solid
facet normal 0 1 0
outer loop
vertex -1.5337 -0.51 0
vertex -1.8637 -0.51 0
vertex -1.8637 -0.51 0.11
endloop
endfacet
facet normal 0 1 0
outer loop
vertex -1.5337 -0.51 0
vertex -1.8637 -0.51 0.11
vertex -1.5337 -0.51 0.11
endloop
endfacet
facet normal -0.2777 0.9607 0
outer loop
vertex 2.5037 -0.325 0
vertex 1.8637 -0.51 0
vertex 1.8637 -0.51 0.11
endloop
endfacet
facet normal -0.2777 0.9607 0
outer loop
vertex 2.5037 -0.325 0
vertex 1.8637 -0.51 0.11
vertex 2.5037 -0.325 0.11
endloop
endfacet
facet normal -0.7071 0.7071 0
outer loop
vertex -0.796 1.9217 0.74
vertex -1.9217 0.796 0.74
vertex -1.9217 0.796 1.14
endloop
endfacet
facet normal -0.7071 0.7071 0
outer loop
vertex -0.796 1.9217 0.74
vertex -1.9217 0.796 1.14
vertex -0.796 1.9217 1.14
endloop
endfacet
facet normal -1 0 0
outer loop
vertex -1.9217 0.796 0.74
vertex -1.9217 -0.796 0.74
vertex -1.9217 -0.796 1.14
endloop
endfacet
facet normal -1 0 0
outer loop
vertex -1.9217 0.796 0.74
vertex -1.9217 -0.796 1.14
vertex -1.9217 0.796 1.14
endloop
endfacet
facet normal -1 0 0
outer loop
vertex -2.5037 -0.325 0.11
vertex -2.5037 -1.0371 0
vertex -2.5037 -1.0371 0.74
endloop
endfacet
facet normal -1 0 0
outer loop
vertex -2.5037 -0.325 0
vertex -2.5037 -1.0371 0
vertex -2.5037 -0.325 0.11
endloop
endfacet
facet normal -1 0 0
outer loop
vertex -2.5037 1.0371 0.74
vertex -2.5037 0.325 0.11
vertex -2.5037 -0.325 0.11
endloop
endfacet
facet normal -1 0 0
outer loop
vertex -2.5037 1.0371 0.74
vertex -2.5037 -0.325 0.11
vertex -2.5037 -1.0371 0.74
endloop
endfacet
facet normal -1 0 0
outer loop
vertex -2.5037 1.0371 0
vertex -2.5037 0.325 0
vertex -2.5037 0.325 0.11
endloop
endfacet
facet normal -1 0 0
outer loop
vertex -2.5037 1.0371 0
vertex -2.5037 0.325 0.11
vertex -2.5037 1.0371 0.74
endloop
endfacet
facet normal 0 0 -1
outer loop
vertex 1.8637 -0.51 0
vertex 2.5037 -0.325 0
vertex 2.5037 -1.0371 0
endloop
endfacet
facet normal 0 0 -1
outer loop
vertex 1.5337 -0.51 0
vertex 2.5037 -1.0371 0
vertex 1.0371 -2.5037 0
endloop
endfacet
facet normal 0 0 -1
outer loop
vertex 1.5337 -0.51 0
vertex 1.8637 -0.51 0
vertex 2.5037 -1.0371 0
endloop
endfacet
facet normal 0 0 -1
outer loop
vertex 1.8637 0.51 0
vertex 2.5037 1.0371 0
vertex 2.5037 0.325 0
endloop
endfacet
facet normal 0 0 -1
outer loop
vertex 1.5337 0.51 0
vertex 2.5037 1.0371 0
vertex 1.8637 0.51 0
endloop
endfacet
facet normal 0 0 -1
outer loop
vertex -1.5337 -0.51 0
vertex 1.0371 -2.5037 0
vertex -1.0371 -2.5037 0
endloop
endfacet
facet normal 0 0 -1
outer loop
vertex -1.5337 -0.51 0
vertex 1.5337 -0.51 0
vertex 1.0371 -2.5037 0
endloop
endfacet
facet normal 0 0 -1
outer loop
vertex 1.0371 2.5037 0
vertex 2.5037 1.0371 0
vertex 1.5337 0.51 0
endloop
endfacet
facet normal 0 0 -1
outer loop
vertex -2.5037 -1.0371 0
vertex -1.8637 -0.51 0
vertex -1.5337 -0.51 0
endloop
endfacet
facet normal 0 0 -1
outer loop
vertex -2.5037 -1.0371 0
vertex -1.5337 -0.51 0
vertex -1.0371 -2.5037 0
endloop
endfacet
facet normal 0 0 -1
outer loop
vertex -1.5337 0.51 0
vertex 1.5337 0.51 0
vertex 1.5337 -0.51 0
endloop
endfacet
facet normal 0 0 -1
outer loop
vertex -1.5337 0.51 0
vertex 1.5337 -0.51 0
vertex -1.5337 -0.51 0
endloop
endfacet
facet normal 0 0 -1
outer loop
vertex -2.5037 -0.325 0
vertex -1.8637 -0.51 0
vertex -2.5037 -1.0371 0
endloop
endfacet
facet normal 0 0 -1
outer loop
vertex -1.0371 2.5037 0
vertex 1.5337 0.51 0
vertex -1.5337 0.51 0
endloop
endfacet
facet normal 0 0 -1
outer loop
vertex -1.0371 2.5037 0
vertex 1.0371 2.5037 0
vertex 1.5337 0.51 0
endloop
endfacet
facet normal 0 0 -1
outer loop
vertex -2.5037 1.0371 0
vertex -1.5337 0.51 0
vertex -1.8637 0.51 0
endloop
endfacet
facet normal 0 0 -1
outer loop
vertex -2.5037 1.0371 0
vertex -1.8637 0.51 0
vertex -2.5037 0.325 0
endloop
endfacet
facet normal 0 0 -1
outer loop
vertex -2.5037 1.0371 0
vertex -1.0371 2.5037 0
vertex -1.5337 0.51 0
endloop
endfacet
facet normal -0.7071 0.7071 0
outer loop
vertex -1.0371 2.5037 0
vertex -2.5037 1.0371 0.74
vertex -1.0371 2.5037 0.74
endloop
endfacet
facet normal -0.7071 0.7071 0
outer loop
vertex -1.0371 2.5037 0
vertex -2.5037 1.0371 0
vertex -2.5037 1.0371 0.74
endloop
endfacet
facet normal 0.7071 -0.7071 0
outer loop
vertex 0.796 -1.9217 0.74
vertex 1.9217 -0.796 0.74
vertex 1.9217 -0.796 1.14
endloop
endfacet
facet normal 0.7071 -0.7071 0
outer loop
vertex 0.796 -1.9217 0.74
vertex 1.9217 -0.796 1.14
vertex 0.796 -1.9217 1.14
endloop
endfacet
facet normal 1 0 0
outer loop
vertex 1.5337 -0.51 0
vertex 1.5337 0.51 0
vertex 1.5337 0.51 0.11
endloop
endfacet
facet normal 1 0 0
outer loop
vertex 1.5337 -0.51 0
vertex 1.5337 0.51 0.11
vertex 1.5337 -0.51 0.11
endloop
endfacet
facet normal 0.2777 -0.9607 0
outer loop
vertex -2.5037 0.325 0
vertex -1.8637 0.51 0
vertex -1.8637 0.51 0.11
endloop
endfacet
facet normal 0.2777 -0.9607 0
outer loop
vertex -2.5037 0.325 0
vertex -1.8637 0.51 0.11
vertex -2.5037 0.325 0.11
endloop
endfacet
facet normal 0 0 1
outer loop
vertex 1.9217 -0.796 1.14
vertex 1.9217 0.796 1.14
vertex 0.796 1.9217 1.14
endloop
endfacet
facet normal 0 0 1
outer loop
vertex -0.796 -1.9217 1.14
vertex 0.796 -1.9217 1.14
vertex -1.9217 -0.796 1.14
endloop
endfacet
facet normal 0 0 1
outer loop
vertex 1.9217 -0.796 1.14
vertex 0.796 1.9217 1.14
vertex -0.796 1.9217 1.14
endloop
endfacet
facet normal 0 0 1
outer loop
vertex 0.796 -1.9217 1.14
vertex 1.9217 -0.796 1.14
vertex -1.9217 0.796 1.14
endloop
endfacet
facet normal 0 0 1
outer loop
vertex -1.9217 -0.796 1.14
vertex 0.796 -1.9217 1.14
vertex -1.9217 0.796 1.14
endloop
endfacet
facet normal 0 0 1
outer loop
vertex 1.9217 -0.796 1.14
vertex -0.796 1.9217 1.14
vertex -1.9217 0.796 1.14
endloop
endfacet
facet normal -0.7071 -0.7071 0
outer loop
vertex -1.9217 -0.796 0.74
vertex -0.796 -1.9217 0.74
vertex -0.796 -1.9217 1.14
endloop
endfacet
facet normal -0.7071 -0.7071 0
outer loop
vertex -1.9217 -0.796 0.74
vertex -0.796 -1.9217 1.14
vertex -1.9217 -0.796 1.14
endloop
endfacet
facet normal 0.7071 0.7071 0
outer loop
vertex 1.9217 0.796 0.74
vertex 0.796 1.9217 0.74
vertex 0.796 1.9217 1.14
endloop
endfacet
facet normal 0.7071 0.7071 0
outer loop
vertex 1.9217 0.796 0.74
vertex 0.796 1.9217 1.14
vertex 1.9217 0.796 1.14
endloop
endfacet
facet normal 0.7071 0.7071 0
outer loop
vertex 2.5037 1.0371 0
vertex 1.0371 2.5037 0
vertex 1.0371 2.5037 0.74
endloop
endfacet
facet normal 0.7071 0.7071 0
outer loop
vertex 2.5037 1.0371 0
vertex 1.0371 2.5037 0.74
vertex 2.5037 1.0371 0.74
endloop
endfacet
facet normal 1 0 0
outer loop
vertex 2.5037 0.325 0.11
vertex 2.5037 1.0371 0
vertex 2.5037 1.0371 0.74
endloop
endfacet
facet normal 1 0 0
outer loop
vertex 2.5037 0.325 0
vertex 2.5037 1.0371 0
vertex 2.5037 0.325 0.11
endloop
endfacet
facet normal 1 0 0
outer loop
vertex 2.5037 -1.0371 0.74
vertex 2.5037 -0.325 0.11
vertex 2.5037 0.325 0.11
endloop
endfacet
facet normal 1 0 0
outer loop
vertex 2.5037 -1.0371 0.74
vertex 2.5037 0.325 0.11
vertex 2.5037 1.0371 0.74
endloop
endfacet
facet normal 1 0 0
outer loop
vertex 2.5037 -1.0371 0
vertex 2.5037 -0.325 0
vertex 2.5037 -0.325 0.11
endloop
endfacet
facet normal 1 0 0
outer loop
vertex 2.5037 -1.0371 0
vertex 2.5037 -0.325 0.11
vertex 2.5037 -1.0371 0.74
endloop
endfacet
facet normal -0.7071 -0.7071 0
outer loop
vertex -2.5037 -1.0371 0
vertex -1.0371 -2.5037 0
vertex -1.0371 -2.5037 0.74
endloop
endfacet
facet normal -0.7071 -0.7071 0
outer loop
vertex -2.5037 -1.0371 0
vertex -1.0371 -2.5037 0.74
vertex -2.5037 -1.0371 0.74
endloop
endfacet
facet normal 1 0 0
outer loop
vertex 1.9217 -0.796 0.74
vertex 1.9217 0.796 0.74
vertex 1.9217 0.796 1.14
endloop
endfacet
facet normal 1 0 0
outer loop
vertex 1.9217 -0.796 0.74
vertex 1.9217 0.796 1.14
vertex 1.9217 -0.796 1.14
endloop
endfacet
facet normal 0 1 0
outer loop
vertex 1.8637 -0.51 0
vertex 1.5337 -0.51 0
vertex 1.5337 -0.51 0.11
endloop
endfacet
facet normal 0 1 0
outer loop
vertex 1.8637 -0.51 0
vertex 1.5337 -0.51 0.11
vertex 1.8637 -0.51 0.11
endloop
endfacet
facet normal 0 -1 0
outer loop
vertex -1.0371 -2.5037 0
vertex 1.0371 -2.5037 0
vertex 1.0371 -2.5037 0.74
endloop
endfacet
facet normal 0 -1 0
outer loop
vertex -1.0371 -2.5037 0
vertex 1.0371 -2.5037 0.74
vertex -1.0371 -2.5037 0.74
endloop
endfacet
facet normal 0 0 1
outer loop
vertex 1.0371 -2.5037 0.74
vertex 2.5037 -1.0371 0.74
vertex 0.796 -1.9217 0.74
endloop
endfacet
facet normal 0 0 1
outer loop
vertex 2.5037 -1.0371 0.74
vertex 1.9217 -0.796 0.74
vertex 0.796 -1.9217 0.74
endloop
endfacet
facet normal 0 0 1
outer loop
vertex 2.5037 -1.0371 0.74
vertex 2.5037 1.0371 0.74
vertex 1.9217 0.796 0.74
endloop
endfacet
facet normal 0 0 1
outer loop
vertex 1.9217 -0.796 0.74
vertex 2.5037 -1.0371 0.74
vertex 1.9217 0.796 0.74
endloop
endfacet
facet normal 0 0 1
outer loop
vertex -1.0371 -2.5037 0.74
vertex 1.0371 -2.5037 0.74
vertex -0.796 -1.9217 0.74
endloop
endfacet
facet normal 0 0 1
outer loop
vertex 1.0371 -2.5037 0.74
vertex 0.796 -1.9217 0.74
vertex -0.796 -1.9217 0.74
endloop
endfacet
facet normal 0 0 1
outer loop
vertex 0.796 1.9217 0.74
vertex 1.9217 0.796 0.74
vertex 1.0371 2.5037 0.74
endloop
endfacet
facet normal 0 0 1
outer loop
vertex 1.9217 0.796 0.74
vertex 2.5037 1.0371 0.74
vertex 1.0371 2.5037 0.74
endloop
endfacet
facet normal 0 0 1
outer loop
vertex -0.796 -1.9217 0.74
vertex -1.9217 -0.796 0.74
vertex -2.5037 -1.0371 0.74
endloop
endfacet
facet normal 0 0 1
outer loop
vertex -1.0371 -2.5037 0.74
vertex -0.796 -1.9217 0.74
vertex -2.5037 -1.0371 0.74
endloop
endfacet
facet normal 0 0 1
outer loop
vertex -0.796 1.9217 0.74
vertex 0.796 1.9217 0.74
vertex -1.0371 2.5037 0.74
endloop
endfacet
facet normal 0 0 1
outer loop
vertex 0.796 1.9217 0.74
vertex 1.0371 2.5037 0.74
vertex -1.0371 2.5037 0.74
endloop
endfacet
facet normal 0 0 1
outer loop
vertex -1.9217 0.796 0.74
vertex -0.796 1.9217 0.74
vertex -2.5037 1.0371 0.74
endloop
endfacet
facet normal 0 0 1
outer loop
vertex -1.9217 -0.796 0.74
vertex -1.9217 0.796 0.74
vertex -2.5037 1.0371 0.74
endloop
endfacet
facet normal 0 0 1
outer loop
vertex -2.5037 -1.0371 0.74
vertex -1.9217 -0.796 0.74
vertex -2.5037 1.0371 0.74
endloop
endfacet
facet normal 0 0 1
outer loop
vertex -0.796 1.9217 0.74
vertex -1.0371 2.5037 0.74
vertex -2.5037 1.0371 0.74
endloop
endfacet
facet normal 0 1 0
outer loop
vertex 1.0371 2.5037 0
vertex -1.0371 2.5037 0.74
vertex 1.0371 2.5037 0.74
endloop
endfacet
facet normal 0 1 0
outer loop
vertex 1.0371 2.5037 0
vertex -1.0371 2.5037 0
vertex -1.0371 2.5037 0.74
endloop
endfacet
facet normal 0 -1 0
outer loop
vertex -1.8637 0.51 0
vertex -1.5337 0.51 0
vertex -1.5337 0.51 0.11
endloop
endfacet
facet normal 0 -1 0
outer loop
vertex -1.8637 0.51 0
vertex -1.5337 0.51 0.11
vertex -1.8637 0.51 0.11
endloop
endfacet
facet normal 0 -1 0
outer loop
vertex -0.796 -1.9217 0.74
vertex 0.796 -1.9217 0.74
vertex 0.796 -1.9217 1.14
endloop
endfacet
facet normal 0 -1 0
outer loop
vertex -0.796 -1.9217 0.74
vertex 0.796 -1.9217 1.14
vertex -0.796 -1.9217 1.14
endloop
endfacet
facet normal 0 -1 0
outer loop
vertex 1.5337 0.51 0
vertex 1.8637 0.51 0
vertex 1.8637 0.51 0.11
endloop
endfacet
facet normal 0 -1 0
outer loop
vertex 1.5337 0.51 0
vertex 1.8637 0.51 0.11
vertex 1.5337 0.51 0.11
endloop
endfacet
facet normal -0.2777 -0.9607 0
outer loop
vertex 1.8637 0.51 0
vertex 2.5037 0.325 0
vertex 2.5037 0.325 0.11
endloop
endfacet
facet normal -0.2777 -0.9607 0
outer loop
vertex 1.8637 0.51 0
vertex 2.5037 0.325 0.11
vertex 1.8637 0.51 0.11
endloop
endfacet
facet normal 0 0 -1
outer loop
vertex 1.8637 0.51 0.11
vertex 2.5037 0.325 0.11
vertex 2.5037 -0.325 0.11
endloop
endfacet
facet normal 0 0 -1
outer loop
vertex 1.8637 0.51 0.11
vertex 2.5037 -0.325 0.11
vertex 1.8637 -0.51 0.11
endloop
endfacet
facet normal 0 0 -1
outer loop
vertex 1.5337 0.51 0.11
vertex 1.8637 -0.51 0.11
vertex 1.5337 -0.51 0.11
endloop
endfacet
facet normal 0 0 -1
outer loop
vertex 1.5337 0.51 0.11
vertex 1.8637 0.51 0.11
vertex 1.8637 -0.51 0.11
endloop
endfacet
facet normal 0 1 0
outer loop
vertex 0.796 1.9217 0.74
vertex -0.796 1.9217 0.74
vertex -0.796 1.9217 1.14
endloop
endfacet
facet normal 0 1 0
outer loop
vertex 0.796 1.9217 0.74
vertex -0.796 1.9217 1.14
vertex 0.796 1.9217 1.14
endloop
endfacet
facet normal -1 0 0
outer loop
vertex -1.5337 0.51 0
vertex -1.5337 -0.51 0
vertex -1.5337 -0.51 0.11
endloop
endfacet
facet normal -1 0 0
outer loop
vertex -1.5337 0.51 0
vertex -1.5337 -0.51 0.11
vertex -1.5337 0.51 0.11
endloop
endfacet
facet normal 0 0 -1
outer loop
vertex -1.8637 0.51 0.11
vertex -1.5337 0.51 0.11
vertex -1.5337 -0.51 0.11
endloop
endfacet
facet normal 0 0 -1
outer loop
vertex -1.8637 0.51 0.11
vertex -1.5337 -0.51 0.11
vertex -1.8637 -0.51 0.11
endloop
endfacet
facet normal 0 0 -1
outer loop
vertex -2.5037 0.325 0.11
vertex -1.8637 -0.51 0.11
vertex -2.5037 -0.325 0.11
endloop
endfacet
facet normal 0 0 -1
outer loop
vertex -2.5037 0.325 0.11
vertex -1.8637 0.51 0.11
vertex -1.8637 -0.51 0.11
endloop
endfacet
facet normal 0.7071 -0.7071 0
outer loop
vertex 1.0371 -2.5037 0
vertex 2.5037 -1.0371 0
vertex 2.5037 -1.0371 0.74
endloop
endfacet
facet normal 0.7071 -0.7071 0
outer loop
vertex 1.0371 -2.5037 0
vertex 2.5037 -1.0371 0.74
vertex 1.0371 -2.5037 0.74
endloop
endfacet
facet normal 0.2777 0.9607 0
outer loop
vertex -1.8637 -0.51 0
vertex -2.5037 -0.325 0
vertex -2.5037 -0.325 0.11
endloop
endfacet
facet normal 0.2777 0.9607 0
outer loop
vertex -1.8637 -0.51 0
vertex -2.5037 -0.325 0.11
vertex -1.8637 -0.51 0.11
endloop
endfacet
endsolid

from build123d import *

# Parameters (mm, degrees)
PAD005_DEPTH = 0.11
PAD006_DEPTH = 0.63
PAD007_DEPTH = 0.4


with BuildPart() as part:
    # Sketch009 → Pad005 (new body)
    with BuildSketch(Plane.XY):
        Polygon((-1.037072, 2.503714), (1.037072, 2.503714), (2.503714, 1.037072), (2.503714, 0.325), (1.863714, 0.51), (1.533714, 0.51), (1.533714, -0.51), (1.863714, -0.51), (2.503714, -0.325), (2.503714, -1.037072), (1.037072, -2.503714), (-1.037072, -2.503714), (-2.503714, -1.037072), (-2.503714, -0.325), (-1.863714, -0.51), (-1.533714, -0.51), (-1.533714, 0.51), (-1.863714, 0.51), (-2.503714, 0.325), (-2.503714, 1.037072), align=None)
    extrude(amount=PAD005_DEPTH)

    # Sketch012 (on Face22 of Pad005) → Pad006 (join)
    with BuildSketch(Plane.XY.offset(0.11)):
        Polygon((-1.037072, 2.503714), (1.037072, 2.503714), (2.503714, 1.037072), (2.503714, -1.037072), (1.037072, -2.503714), (-1.037072, -2.503714), (-2.503714, -1.037072), (-2.503714, 1.037072), align=None)
    extrude(amount=PAD006_DEPTH)

    # Sketch013 (on Face1 of Pad006) → Pad007 (join)
    with BuildSketch(Plane.XY.offset(0.74)):
        Polygon((-0.795982, 1.921669), (0.795982, 1.921669), (1.921669, 0.795982), (1.921669, -0.795982), (0.795982, -1.921669), (-0.795982, -1.921669), (-1.921669, -0.795982), (-1.921669, 0.795982), align=None)
    extrude(amount=PAD007_DEPTH)


solid = part.part
